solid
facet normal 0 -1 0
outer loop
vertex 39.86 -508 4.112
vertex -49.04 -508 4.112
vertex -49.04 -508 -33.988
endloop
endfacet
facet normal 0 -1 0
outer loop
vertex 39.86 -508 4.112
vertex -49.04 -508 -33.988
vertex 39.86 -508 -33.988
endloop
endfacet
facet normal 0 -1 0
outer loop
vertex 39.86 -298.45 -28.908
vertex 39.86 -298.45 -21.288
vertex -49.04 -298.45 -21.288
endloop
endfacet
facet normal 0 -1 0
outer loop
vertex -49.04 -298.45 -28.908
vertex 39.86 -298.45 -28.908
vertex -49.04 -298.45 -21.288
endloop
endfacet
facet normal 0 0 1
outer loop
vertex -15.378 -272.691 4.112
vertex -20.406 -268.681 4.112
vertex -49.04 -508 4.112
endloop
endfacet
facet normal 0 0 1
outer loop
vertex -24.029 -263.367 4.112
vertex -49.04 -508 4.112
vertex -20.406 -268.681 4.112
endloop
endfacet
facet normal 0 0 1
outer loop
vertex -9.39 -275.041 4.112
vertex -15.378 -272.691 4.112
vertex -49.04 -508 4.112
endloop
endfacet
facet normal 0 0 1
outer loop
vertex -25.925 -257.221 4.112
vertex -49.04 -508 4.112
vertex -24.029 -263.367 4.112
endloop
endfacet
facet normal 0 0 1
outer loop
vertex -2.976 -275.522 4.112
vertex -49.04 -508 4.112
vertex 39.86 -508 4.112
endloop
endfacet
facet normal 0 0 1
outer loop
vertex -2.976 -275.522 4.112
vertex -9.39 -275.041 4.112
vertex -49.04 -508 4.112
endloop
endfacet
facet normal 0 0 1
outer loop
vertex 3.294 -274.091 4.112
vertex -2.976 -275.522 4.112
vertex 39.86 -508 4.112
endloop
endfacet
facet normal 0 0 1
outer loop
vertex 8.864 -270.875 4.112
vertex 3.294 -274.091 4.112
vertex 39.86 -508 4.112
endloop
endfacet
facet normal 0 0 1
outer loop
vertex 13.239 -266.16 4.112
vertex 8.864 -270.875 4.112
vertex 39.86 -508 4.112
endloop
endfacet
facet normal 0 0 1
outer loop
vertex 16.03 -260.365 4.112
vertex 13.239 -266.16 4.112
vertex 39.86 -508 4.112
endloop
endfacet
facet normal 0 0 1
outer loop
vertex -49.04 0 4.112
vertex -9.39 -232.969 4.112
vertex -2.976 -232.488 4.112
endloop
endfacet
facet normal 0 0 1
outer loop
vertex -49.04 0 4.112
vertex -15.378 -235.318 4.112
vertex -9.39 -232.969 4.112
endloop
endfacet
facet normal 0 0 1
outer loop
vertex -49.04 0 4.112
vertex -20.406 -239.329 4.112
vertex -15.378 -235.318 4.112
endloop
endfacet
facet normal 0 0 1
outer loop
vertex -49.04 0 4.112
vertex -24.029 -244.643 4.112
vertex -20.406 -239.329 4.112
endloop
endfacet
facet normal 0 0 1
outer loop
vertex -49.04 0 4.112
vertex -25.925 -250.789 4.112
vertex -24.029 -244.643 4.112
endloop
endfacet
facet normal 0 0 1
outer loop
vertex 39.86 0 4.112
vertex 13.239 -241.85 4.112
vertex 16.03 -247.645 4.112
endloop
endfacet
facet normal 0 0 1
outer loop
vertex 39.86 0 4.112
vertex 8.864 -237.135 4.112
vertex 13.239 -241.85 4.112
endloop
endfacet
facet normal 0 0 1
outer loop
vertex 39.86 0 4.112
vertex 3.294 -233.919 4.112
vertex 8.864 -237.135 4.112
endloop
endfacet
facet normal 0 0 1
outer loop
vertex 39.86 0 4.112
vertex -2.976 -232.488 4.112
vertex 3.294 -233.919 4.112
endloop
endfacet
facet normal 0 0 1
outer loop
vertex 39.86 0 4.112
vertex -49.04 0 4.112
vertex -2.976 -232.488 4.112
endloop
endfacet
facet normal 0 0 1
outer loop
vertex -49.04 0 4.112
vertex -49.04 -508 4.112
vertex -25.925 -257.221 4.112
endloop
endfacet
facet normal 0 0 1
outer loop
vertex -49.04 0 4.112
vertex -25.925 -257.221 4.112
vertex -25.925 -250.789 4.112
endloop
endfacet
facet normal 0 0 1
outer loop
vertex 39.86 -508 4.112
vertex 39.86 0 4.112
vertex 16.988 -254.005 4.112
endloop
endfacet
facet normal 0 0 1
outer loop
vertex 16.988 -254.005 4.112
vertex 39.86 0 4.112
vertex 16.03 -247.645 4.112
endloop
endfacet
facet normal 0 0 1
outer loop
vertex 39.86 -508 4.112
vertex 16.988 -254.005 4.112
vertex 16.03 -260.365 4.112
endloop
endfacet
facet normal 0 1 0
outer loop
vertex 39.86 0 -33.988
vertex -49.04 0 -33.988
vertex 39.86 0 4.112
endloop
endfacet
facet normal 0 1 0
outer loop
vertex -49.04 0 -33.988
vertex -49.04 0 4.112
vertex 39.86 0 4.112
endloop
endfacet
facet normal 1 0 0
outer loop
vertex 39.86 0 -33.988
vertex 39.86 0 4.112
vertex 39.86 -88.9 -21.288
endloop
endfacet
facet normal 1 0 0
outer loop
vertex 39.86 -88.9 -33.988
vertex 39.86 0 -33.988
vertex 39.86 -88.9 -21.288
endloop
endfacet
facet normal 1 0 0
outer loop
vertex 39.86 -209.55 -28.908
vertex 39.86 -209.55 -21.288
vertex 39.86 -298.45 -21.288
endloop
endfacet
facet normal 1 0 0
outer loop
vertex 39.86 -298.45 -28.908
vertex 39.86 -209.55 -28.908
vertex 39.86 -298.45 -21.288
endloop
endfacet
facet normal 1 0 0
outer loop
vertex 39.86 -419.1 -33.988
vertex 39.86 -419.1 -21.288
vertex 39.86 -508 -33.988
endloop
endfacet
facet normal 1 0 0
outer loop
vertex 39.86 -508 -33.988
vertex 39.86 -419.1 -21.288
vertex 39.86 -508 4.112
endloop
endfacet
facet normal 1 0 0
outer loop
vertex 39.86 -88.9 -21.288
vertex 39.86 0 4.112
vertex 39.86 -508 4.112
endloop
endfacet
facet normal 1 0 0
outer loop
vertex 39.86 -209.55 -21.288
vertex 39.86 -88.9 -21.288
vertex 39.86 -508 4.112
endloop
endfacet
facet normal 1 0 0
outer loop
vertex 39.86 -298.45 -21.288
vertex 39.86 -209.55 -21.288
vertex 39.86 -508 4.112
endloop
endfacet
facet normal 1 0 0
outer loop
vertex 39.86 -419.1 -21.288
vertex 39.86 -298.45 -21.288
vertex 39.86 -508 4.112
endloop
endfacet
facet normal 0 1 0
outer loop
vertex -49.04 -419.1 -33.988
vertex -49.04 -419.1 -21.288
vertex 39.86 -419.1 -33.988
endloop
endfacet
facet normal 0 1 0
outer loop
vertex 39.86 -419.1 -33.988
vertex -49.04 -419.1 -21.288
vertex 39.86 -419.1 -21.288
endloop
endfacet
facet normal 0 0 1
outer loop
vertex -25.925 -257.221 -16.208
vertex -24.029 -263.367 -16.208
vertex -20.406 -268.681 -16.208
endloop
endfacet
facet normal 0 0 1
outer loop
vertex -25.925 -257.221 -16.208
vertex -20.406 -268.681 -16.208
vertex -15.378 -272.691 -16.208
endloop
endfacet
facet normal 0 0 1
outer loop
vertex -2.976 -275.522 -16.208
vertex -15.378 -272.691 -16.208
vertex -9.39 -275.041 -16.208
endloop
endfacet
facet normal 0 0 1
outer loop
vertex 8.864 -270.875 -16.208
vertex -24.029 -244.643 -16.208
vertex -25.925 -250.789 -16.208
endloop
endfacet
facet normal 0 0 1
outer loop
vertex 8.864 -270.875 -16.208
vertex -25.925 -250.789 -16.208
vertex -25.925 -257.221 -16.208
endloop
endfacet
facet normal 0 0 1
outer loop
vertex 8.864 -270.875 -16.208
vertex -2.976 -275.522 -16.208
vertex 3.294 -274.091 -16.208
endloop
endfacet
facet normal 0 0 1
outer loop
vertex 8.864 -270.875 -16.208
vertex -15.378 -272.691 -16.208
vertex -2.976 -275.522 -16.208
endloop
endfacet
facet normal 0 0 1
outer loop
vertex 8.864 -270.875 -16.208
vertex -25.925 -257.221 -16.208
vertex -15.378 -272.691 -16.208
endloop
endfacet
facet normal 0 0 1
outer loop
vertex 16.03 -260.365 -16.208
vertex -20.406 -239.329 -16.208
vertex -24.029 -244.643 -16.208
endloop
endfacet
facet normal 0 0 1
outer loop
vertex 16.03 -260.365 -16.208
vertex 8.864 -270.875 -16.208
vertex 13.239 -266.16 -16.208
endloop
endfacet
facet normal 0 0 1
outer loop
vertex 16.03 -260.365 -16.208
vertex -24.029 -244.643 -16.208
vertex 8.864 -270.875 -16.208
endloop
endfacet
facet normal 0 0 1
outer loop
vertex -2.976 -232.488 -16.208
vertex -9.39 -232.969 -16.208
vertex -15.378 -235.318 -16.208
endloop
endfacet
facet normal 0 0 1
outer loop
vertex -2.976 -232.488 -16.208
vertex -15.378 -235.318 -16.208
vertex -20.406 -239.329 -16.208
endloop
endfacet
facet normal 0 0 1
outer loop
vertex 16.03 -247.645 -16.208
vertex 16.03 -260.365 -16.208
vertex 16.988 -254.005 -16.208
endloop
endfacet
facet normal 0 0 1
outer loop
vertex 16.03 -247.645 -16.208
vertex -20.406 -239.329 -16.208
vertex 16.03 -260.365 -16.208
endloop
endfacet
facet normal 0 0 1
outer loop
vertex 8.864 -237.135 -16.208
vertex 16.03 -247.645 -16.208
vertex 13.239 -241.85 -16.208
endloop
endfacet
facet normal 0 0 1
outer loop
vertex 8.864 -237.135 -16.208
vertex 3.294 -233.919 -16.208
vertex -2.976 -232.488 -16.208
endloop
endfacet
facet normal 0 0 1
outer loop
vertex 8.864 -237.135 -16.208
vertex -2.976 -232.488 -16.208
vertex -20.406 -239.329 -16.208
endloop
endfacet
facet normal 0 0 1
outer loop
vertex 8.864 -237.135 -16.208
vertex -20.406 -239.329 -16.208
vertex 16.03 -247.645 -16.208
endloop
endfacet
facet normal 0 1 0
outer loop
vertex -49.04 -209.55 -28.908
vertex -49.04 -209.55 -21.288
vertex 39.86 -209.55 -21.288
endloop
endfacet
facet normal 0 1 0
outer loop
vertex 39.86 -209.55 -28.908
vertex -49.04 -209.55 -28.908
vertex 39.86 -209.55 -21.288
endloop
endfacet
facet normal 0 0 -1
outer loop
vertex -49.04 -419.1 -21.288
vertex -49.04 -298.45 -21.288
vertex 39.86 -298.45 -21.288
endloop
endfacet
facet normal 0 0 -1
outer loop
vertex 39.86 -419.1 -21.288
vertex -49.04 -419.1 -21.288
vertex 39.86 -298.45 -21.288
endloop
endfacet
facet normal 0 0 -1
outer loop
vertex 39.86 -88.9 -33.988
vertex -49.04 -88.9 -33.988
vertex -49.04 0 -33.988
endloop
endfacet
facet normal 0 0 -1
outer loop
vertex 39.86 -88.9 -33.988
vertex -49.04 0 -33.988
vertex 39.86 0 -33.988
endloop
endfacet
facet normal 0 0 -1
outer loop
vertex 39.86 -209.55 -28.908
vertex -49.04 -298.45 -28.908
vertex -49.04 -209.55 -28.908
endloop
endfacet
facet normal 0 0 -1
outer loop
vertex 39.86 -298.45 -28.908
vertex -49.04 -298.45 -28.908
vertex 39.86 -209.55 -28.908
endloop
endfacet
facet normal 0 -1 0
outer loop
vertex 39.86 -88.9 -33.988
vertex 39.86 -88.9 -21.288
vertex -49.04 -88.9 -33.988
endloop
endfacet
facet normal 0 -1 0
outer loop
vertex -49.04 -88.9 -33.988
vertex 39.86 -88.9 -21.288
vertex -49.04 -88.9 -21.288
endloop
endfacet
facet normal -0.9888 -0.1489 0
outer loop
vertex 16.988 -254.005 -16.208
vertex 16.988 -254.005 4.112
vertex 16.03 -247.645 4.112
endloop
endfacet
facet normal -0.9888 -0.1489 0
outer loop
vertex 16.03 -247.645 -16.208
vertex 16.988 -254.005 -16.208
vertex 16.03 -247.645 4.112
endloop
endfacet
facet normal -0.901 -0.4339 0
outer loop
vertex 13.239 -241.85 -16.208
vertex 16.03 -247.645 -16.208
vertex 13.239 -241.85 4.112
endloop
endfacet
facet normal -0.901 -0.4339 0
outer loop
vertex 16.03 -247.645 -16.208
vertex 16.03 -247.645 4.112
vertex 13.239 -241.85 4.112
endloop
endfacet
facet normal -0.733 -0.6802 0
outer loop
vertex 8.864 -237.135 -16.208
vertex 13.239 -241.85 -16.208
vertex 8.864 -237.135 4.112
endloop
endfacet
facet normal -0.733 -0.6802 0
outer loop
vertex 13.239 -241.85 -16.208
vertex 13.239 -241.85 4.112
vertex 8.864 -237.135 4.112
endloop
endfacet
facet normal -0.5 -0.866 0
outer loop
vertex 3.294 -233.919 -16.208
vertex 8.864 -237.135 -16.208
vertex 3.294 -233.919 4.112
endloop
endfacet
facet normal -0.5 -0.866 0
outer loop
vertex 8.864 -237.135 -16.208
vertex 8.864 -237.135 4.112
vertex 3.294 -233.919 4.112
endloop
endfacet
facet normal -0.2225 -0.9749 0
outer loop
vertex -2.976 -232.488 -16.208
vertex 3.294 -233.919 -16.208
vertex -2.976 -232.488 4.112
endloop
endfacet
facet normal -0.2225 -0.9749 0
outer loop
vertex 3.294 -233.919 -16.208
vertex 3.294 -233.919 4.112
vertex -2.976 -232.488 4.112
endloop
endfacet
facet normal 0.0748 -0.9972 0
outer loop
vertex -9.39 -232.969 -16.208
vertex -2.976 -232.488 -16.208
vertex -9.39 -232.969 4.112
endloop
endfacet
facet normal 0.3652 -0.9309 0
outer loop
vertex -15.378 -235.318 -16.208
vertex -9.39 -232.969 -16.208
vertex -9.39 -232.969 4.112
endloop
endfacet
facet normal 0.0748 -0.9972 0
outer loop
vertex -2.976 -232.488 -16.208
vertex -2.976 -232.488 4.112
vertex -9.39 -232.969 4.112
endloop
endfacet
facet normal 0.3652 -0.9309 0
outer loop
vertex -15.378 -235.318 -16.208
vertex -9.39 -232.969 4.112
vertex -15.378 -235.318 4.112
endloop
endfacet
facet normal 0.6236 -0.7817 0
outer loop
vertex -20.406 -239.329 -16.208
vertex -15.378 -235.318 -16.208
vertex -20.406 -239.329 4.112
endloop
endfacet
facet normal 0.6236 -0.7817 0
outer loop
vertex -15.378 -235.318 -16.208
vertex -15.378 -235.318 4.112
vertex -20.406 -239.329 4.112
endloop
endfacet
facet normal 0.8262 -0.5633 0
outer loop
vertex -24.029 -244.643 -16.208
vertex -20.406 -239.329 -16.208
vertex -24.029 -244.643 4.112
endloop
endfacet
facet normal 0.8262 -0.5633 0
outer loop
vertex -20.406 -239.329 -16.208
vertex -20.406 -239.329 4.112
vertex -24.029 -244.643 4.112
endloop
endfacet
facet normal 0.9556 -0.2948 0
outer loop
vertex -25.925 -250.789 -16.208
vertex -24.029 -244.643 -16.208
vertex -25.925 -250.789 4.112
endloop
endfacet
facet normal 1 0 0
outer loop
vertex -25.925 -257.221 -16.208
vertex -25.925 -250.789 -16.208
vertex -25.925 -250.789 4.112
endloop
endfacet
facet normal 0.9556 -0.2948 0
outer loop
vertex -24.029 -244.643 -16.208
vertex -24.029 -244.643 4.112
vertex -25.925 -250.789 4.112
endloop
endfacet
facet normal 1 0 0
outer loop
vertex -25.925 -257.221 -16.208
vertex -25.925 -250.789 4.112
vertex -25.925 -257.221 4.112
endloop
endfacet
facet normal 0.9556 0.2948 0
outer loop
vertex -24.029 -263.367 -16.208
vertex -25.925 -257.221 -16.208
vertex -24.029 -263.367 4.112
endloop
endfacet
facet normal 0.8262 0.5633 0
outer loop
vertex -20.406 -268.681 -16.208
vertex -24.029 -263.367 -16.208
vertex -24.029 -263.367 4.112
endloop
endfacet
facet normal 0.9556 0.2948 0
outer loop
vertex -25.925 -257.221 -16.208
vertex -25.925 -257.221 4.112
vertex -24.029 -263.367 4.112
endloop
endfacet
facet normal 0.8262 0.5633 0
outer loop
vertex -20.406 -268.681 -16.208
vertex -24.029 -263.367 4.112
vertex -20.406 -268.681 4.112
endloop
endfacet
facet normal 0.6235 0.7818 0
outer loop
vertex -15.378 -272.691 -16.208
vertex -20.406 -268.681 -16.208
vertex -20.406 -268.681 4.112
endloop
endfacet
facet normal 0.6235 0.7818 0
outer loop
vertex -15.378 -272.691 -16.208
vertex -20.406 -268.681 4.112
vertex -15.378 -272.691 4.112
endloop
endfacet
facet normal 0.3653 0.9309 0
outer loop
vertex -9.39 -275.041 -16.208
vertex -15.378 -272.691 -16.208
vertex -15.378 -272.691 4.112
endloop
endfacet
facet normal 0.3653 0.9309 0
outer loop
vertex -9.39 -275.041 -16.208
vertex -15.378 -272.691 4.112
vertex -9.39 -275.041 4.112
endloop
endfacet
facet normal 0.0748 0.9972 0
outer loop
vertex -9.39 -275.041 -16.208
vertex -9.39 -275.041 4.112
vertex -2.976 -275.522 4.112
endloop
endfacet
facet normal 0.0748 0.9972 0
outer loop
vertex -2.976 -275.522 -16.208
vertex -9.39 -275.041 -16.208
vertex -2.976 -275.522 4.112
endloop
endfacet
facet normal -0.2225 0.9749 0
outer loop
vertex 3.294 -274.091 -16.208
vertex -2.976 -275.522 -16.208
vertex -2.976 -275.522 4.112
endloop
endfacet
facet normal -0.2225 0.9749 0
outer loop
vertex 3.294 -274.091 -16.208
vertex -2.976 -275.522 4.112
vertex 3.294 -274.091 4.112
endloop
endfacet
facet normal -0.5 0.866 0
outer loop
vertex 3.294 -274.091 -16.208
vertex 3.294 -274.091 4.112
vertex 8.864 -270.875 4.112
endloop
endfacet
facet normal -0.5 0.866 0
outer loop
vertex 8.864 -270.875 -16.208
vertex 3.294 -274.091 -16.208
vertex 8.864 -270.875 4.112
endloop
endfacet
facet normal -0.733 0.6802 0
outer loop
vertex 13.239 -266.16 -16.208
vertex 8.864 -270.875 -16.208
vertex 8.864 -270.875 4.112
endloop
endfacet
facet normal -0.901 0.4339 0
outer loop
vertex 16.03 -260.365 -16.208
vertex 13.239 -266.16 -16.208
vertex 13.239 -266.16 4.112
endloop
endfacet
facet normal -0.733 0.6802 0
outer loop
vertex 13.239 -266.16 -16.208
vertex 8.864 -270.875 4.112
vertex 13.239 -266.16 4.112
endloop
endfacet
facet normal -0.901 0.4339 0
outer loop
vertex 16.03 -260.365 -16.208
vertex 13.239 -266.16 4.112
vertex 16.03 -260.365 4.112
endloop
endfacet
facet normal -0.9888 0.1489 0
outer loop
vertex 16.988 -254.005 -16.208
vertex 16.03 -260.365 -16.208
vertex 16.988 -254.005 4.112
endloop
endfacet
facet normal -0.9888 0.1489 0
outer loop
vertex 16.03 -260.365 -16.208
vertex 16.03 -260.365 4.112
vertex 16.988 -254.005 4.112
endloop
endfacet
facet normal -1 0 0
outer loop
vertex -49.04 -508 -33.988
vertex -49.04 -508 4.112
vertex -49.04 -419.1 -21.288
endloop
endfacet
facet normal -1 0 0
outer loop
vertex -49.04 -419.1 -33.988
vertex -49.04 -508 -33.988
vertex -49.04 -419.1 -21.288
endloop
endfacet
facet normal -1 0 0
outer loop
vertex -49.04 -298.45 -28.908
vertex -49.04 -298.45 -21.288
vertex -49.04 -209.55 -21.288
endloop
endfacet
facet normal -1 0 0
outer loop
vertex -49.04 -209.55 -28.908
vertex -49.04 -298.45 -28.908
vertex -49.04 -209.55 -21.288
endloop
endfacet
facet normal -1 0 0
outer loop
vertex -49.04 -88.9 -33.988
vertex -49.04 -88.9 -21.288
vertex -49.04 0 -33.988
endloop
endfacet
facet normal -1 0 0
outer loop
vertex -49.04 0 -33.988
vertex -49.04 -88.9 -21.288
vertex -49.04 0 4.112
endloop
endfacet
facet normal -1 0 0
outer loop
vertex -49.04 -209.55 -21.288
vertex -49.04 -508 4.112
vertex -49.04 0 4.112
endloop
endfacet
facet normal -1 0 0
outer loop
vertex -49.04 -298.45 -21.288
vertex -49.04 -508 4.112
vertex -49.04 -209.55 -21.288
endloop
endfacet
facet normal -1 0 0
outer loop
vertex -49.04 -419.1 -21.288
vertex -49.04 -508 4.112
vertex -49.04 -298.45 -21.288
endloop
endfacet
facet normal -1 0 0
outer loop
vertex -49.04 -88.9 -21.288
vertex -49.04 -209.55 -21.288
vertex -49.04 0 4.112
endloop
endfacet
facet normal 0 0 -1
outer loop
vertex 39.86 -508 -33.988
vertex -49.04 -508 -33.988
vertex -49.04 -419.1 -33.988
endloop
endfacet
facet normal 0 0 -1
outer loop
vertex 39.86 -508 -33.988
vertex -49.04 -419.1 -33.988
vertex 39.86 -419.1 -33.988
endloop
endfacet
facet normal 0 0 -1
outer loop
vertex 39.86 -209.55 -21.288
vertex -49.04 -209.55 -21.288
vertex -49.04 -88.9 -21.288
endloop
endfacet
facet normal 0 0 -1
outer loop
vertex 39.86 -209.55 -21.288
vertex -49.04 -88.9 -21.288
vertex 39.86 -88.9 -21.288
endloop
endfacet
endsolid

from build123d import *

# Parameters (mm, degrees)
F0_W     = 88.9
F0_H     = 25.4
F1_DEPTH = 508
F3_DEPTH = 12.7
F4_W     = 44.45
F4_H     = 44.45
F5_DEPTH = 4.445
F6_DEPTH = 7.62
F8_R     = 21.5773
F9_DEPTH = 20.32


with BuildPart() as f1:
    # F0 (on Front) → F1 (new body)
    with BuildSketch(Plane.XZ):
        with Locations((-4.590311, -8.587727)):
            Rectangle(F0_W, F0_H)
    extrude(amount=F1_DEPTH)

    # F2 (on face) → F3 (join)
    with BuildSketch(Plane(origin=(0, 0, -21.287727), x_dir=(1, 0, 0), z_dir=(0, 0, -1))):
        Polygon((-4.590311, 88.9), (-49.040311, 88.9), (-49.040311, 0), (39.859689, 0), (39.859689, 88.9), align=None)
        Polygon((-49.040311, 508), (-49.040311, 419.1), (-4.590311, 419.1), (39.859689, 419.1), (39.859689, 508), align=None)
    extrude(amount=F3_DEPTH)

    # F4 (on face) → F5 (join)
    with BuildSketch(Plane(origin=(0, 0, -21.287727), x_dir=(1, 0, 0), z_dir=(0, 0, -1))):
        with Locations((17.634689, 231.775)):
            Rectangle(F4_W, F4_H)
        Polygon((-49.040311, 209.55), (-4.590311, 209.55), (-4.590311, 254), (-4.590311, 298.45), (-49.040311, 298.45), align=None)
        with Locations((17.634689, 276.225)):
            Rectangle(F4_W, F4_H)
    extrude(amount=F5_DEPTH)

    # F4 (on face) → F6 (join)
    with BuildSketch(Plane(origin=(0, 0, -21.287727), x_dir=(1, 0, 0), z_dir=(0, 0, -1))):
        with Locations((17.634689, 231.775)):
            Rectangle(F4_W, F4_H)
        Polygon((-49.040311, 209.55), (-4.590311, 209.55), (-4.590311, 254), (-4.590311, 298.45), (-49.040311, 298.45), align=None)
        with Locations((17.634689, 276.225)):
            Rectangle(F4_W, F4_H)
    extrude(amount=F6_DEPTH)

    # F8 (on face) → F9 (cut)
    with BuildSketch(Plane.XY.offset(4.112273)):
        with Locations((-4.588948, -254.004985)):
            Circle(F8_R)
    extrude(amount=-F9_DEPTH, mode=Mode.SUBTRACT)


solid = f1.part
